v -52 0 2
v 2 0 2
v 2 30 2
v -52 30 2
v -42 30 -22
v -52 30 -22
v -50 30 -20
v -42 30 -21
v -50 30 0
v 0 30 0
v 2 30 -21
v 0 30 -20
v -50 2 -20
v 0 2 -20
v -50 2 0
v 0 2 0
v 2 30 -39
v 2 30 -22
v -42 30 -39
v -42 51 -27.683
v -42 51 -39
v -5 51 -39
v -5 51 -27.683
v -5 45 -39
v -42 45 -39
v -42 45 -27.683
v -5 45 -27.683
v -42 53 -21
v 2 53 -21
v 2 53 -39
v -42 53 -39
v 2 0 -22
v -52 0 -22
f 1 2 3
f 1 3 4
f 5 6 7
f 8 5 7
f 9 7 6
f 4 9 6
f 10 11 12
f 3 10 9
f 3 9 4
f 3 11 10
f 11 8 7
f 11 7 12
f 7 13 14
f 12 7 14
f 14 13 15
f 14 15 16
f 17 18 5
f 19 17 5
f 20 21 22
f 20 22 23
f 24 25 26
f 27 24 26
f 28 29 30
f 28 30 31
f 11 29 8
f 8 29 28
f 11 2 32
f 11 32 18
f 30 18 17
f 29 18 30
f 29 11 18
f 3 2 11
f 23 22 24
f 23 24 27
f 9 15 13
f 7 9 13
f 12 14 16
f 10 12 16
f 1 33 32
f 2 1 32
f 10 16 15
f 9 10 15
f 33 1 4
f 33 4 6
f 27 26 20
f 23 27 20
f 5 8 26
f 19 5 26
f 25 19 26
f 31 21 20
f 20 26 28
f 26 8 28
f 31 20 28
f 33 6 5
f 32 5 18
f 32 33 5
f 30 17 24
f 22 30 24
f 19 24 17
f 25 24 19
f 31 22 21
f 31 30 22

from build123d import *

# Parameters (mm, degrees)
SURFACE_EXTRUSION1_1_DEPTH = 30
EPAISSIR1_T1               = 2
EPAISSIR2_OUTLINE_W        = 50
EPAISSIR2_OUTLINE_H        = 20
EPAISSIR2_DEPTH            = 2
BOSS_EXTRU_1_DEPTH         = 17
BOSS_EXTRU_1_DEPTH_BACK    = 1
ESQUISSE2_W                = 44
ESQUISSE2_H                = 23
ESQUISSE3_W                = 11.316968607
ESQUISSE3_H                = 6
ENL_V_MAT_EXTRU_1_DEPTH    = 47


# Read off the part's stored shape, not the designer's step: Epaissir2
with BuildPart() as body_1:
    # Surface-Extrusion1: a surface, the sketch's curves swept straight by 30 mm
    with BuildLine(Plane(origin=(0, 0, 0), x_dir=(1, 0, 0), z_dir=(0, 1, 0)), mode=Mode.PRIVATE) as surface_extrusion1_1_path:
        Line((0, 0), (-50, 0))
        Line((-50, 0), (-50, 20))
        Line((-50, 20), (0, 20))
        Line((0, 20), (0, 0))
    surface_extrusion1_1 = Shell.extrude(surface_extrusion1_1_path.wire(), (0 * SURFACE_EXTRUSION1_1_DEPTH, 1 * SURFACE_EXTRUSION1_1_DEPTH, 0 * SURFACE_EXTRUSION1_1_DEPTH))
    add(Solid.thicken(surface_extrusion1_1, EPAISSIR1_T1))

    # Epaissir2 outline → Epaissir2 (add)
    with BuildSketch(Plane(origin=(0, 0, 0), x_dir=(1, 0, 0), z_dir=(0, 1, 0))):
        with Locations((-25, 10)):
            Rectangle(EPAISSIR2_OUTLINE_W, EPAISSIR2_OUTLINE_H)
    extrude(amount=EPAISSIR2_DEPTH)

    # Esquisse2 → Boss.-Extru.1 (add, two sides: drawn at the far end of the back side and taken through both)
    with BuildSketch(Plane(origin=(0, 0, -22), x_dir=(-1, 0, 0), z_dir=(0, 0, -1)).offset(-BOSS_EXTRU_1_DEPTH_BACK)):
        with Locations((20, 41.5)):
            Rectangle(ESQUISSE2_W, ESQUISSE2_H)
    extrude(amount=BOSS_EXTRU_1_DEPTH + BOSS_EXTRU_1_DEPTH_BACK)

    # Esquisse3 → Enlèv. mat.-Extru.1 (cut)
    with BuildSketch(Plane.ZY.offset(52)):
        with Locations((-33.341515696, 48)):
            Rectangle(ESQUISSE3_W, ESQUISSE3_H)
    extrude(amount=-ENL_V_MAT_EXTRU_1_DEPTH, mode=Mode.SUBTRACT)


solid = body_1.part
